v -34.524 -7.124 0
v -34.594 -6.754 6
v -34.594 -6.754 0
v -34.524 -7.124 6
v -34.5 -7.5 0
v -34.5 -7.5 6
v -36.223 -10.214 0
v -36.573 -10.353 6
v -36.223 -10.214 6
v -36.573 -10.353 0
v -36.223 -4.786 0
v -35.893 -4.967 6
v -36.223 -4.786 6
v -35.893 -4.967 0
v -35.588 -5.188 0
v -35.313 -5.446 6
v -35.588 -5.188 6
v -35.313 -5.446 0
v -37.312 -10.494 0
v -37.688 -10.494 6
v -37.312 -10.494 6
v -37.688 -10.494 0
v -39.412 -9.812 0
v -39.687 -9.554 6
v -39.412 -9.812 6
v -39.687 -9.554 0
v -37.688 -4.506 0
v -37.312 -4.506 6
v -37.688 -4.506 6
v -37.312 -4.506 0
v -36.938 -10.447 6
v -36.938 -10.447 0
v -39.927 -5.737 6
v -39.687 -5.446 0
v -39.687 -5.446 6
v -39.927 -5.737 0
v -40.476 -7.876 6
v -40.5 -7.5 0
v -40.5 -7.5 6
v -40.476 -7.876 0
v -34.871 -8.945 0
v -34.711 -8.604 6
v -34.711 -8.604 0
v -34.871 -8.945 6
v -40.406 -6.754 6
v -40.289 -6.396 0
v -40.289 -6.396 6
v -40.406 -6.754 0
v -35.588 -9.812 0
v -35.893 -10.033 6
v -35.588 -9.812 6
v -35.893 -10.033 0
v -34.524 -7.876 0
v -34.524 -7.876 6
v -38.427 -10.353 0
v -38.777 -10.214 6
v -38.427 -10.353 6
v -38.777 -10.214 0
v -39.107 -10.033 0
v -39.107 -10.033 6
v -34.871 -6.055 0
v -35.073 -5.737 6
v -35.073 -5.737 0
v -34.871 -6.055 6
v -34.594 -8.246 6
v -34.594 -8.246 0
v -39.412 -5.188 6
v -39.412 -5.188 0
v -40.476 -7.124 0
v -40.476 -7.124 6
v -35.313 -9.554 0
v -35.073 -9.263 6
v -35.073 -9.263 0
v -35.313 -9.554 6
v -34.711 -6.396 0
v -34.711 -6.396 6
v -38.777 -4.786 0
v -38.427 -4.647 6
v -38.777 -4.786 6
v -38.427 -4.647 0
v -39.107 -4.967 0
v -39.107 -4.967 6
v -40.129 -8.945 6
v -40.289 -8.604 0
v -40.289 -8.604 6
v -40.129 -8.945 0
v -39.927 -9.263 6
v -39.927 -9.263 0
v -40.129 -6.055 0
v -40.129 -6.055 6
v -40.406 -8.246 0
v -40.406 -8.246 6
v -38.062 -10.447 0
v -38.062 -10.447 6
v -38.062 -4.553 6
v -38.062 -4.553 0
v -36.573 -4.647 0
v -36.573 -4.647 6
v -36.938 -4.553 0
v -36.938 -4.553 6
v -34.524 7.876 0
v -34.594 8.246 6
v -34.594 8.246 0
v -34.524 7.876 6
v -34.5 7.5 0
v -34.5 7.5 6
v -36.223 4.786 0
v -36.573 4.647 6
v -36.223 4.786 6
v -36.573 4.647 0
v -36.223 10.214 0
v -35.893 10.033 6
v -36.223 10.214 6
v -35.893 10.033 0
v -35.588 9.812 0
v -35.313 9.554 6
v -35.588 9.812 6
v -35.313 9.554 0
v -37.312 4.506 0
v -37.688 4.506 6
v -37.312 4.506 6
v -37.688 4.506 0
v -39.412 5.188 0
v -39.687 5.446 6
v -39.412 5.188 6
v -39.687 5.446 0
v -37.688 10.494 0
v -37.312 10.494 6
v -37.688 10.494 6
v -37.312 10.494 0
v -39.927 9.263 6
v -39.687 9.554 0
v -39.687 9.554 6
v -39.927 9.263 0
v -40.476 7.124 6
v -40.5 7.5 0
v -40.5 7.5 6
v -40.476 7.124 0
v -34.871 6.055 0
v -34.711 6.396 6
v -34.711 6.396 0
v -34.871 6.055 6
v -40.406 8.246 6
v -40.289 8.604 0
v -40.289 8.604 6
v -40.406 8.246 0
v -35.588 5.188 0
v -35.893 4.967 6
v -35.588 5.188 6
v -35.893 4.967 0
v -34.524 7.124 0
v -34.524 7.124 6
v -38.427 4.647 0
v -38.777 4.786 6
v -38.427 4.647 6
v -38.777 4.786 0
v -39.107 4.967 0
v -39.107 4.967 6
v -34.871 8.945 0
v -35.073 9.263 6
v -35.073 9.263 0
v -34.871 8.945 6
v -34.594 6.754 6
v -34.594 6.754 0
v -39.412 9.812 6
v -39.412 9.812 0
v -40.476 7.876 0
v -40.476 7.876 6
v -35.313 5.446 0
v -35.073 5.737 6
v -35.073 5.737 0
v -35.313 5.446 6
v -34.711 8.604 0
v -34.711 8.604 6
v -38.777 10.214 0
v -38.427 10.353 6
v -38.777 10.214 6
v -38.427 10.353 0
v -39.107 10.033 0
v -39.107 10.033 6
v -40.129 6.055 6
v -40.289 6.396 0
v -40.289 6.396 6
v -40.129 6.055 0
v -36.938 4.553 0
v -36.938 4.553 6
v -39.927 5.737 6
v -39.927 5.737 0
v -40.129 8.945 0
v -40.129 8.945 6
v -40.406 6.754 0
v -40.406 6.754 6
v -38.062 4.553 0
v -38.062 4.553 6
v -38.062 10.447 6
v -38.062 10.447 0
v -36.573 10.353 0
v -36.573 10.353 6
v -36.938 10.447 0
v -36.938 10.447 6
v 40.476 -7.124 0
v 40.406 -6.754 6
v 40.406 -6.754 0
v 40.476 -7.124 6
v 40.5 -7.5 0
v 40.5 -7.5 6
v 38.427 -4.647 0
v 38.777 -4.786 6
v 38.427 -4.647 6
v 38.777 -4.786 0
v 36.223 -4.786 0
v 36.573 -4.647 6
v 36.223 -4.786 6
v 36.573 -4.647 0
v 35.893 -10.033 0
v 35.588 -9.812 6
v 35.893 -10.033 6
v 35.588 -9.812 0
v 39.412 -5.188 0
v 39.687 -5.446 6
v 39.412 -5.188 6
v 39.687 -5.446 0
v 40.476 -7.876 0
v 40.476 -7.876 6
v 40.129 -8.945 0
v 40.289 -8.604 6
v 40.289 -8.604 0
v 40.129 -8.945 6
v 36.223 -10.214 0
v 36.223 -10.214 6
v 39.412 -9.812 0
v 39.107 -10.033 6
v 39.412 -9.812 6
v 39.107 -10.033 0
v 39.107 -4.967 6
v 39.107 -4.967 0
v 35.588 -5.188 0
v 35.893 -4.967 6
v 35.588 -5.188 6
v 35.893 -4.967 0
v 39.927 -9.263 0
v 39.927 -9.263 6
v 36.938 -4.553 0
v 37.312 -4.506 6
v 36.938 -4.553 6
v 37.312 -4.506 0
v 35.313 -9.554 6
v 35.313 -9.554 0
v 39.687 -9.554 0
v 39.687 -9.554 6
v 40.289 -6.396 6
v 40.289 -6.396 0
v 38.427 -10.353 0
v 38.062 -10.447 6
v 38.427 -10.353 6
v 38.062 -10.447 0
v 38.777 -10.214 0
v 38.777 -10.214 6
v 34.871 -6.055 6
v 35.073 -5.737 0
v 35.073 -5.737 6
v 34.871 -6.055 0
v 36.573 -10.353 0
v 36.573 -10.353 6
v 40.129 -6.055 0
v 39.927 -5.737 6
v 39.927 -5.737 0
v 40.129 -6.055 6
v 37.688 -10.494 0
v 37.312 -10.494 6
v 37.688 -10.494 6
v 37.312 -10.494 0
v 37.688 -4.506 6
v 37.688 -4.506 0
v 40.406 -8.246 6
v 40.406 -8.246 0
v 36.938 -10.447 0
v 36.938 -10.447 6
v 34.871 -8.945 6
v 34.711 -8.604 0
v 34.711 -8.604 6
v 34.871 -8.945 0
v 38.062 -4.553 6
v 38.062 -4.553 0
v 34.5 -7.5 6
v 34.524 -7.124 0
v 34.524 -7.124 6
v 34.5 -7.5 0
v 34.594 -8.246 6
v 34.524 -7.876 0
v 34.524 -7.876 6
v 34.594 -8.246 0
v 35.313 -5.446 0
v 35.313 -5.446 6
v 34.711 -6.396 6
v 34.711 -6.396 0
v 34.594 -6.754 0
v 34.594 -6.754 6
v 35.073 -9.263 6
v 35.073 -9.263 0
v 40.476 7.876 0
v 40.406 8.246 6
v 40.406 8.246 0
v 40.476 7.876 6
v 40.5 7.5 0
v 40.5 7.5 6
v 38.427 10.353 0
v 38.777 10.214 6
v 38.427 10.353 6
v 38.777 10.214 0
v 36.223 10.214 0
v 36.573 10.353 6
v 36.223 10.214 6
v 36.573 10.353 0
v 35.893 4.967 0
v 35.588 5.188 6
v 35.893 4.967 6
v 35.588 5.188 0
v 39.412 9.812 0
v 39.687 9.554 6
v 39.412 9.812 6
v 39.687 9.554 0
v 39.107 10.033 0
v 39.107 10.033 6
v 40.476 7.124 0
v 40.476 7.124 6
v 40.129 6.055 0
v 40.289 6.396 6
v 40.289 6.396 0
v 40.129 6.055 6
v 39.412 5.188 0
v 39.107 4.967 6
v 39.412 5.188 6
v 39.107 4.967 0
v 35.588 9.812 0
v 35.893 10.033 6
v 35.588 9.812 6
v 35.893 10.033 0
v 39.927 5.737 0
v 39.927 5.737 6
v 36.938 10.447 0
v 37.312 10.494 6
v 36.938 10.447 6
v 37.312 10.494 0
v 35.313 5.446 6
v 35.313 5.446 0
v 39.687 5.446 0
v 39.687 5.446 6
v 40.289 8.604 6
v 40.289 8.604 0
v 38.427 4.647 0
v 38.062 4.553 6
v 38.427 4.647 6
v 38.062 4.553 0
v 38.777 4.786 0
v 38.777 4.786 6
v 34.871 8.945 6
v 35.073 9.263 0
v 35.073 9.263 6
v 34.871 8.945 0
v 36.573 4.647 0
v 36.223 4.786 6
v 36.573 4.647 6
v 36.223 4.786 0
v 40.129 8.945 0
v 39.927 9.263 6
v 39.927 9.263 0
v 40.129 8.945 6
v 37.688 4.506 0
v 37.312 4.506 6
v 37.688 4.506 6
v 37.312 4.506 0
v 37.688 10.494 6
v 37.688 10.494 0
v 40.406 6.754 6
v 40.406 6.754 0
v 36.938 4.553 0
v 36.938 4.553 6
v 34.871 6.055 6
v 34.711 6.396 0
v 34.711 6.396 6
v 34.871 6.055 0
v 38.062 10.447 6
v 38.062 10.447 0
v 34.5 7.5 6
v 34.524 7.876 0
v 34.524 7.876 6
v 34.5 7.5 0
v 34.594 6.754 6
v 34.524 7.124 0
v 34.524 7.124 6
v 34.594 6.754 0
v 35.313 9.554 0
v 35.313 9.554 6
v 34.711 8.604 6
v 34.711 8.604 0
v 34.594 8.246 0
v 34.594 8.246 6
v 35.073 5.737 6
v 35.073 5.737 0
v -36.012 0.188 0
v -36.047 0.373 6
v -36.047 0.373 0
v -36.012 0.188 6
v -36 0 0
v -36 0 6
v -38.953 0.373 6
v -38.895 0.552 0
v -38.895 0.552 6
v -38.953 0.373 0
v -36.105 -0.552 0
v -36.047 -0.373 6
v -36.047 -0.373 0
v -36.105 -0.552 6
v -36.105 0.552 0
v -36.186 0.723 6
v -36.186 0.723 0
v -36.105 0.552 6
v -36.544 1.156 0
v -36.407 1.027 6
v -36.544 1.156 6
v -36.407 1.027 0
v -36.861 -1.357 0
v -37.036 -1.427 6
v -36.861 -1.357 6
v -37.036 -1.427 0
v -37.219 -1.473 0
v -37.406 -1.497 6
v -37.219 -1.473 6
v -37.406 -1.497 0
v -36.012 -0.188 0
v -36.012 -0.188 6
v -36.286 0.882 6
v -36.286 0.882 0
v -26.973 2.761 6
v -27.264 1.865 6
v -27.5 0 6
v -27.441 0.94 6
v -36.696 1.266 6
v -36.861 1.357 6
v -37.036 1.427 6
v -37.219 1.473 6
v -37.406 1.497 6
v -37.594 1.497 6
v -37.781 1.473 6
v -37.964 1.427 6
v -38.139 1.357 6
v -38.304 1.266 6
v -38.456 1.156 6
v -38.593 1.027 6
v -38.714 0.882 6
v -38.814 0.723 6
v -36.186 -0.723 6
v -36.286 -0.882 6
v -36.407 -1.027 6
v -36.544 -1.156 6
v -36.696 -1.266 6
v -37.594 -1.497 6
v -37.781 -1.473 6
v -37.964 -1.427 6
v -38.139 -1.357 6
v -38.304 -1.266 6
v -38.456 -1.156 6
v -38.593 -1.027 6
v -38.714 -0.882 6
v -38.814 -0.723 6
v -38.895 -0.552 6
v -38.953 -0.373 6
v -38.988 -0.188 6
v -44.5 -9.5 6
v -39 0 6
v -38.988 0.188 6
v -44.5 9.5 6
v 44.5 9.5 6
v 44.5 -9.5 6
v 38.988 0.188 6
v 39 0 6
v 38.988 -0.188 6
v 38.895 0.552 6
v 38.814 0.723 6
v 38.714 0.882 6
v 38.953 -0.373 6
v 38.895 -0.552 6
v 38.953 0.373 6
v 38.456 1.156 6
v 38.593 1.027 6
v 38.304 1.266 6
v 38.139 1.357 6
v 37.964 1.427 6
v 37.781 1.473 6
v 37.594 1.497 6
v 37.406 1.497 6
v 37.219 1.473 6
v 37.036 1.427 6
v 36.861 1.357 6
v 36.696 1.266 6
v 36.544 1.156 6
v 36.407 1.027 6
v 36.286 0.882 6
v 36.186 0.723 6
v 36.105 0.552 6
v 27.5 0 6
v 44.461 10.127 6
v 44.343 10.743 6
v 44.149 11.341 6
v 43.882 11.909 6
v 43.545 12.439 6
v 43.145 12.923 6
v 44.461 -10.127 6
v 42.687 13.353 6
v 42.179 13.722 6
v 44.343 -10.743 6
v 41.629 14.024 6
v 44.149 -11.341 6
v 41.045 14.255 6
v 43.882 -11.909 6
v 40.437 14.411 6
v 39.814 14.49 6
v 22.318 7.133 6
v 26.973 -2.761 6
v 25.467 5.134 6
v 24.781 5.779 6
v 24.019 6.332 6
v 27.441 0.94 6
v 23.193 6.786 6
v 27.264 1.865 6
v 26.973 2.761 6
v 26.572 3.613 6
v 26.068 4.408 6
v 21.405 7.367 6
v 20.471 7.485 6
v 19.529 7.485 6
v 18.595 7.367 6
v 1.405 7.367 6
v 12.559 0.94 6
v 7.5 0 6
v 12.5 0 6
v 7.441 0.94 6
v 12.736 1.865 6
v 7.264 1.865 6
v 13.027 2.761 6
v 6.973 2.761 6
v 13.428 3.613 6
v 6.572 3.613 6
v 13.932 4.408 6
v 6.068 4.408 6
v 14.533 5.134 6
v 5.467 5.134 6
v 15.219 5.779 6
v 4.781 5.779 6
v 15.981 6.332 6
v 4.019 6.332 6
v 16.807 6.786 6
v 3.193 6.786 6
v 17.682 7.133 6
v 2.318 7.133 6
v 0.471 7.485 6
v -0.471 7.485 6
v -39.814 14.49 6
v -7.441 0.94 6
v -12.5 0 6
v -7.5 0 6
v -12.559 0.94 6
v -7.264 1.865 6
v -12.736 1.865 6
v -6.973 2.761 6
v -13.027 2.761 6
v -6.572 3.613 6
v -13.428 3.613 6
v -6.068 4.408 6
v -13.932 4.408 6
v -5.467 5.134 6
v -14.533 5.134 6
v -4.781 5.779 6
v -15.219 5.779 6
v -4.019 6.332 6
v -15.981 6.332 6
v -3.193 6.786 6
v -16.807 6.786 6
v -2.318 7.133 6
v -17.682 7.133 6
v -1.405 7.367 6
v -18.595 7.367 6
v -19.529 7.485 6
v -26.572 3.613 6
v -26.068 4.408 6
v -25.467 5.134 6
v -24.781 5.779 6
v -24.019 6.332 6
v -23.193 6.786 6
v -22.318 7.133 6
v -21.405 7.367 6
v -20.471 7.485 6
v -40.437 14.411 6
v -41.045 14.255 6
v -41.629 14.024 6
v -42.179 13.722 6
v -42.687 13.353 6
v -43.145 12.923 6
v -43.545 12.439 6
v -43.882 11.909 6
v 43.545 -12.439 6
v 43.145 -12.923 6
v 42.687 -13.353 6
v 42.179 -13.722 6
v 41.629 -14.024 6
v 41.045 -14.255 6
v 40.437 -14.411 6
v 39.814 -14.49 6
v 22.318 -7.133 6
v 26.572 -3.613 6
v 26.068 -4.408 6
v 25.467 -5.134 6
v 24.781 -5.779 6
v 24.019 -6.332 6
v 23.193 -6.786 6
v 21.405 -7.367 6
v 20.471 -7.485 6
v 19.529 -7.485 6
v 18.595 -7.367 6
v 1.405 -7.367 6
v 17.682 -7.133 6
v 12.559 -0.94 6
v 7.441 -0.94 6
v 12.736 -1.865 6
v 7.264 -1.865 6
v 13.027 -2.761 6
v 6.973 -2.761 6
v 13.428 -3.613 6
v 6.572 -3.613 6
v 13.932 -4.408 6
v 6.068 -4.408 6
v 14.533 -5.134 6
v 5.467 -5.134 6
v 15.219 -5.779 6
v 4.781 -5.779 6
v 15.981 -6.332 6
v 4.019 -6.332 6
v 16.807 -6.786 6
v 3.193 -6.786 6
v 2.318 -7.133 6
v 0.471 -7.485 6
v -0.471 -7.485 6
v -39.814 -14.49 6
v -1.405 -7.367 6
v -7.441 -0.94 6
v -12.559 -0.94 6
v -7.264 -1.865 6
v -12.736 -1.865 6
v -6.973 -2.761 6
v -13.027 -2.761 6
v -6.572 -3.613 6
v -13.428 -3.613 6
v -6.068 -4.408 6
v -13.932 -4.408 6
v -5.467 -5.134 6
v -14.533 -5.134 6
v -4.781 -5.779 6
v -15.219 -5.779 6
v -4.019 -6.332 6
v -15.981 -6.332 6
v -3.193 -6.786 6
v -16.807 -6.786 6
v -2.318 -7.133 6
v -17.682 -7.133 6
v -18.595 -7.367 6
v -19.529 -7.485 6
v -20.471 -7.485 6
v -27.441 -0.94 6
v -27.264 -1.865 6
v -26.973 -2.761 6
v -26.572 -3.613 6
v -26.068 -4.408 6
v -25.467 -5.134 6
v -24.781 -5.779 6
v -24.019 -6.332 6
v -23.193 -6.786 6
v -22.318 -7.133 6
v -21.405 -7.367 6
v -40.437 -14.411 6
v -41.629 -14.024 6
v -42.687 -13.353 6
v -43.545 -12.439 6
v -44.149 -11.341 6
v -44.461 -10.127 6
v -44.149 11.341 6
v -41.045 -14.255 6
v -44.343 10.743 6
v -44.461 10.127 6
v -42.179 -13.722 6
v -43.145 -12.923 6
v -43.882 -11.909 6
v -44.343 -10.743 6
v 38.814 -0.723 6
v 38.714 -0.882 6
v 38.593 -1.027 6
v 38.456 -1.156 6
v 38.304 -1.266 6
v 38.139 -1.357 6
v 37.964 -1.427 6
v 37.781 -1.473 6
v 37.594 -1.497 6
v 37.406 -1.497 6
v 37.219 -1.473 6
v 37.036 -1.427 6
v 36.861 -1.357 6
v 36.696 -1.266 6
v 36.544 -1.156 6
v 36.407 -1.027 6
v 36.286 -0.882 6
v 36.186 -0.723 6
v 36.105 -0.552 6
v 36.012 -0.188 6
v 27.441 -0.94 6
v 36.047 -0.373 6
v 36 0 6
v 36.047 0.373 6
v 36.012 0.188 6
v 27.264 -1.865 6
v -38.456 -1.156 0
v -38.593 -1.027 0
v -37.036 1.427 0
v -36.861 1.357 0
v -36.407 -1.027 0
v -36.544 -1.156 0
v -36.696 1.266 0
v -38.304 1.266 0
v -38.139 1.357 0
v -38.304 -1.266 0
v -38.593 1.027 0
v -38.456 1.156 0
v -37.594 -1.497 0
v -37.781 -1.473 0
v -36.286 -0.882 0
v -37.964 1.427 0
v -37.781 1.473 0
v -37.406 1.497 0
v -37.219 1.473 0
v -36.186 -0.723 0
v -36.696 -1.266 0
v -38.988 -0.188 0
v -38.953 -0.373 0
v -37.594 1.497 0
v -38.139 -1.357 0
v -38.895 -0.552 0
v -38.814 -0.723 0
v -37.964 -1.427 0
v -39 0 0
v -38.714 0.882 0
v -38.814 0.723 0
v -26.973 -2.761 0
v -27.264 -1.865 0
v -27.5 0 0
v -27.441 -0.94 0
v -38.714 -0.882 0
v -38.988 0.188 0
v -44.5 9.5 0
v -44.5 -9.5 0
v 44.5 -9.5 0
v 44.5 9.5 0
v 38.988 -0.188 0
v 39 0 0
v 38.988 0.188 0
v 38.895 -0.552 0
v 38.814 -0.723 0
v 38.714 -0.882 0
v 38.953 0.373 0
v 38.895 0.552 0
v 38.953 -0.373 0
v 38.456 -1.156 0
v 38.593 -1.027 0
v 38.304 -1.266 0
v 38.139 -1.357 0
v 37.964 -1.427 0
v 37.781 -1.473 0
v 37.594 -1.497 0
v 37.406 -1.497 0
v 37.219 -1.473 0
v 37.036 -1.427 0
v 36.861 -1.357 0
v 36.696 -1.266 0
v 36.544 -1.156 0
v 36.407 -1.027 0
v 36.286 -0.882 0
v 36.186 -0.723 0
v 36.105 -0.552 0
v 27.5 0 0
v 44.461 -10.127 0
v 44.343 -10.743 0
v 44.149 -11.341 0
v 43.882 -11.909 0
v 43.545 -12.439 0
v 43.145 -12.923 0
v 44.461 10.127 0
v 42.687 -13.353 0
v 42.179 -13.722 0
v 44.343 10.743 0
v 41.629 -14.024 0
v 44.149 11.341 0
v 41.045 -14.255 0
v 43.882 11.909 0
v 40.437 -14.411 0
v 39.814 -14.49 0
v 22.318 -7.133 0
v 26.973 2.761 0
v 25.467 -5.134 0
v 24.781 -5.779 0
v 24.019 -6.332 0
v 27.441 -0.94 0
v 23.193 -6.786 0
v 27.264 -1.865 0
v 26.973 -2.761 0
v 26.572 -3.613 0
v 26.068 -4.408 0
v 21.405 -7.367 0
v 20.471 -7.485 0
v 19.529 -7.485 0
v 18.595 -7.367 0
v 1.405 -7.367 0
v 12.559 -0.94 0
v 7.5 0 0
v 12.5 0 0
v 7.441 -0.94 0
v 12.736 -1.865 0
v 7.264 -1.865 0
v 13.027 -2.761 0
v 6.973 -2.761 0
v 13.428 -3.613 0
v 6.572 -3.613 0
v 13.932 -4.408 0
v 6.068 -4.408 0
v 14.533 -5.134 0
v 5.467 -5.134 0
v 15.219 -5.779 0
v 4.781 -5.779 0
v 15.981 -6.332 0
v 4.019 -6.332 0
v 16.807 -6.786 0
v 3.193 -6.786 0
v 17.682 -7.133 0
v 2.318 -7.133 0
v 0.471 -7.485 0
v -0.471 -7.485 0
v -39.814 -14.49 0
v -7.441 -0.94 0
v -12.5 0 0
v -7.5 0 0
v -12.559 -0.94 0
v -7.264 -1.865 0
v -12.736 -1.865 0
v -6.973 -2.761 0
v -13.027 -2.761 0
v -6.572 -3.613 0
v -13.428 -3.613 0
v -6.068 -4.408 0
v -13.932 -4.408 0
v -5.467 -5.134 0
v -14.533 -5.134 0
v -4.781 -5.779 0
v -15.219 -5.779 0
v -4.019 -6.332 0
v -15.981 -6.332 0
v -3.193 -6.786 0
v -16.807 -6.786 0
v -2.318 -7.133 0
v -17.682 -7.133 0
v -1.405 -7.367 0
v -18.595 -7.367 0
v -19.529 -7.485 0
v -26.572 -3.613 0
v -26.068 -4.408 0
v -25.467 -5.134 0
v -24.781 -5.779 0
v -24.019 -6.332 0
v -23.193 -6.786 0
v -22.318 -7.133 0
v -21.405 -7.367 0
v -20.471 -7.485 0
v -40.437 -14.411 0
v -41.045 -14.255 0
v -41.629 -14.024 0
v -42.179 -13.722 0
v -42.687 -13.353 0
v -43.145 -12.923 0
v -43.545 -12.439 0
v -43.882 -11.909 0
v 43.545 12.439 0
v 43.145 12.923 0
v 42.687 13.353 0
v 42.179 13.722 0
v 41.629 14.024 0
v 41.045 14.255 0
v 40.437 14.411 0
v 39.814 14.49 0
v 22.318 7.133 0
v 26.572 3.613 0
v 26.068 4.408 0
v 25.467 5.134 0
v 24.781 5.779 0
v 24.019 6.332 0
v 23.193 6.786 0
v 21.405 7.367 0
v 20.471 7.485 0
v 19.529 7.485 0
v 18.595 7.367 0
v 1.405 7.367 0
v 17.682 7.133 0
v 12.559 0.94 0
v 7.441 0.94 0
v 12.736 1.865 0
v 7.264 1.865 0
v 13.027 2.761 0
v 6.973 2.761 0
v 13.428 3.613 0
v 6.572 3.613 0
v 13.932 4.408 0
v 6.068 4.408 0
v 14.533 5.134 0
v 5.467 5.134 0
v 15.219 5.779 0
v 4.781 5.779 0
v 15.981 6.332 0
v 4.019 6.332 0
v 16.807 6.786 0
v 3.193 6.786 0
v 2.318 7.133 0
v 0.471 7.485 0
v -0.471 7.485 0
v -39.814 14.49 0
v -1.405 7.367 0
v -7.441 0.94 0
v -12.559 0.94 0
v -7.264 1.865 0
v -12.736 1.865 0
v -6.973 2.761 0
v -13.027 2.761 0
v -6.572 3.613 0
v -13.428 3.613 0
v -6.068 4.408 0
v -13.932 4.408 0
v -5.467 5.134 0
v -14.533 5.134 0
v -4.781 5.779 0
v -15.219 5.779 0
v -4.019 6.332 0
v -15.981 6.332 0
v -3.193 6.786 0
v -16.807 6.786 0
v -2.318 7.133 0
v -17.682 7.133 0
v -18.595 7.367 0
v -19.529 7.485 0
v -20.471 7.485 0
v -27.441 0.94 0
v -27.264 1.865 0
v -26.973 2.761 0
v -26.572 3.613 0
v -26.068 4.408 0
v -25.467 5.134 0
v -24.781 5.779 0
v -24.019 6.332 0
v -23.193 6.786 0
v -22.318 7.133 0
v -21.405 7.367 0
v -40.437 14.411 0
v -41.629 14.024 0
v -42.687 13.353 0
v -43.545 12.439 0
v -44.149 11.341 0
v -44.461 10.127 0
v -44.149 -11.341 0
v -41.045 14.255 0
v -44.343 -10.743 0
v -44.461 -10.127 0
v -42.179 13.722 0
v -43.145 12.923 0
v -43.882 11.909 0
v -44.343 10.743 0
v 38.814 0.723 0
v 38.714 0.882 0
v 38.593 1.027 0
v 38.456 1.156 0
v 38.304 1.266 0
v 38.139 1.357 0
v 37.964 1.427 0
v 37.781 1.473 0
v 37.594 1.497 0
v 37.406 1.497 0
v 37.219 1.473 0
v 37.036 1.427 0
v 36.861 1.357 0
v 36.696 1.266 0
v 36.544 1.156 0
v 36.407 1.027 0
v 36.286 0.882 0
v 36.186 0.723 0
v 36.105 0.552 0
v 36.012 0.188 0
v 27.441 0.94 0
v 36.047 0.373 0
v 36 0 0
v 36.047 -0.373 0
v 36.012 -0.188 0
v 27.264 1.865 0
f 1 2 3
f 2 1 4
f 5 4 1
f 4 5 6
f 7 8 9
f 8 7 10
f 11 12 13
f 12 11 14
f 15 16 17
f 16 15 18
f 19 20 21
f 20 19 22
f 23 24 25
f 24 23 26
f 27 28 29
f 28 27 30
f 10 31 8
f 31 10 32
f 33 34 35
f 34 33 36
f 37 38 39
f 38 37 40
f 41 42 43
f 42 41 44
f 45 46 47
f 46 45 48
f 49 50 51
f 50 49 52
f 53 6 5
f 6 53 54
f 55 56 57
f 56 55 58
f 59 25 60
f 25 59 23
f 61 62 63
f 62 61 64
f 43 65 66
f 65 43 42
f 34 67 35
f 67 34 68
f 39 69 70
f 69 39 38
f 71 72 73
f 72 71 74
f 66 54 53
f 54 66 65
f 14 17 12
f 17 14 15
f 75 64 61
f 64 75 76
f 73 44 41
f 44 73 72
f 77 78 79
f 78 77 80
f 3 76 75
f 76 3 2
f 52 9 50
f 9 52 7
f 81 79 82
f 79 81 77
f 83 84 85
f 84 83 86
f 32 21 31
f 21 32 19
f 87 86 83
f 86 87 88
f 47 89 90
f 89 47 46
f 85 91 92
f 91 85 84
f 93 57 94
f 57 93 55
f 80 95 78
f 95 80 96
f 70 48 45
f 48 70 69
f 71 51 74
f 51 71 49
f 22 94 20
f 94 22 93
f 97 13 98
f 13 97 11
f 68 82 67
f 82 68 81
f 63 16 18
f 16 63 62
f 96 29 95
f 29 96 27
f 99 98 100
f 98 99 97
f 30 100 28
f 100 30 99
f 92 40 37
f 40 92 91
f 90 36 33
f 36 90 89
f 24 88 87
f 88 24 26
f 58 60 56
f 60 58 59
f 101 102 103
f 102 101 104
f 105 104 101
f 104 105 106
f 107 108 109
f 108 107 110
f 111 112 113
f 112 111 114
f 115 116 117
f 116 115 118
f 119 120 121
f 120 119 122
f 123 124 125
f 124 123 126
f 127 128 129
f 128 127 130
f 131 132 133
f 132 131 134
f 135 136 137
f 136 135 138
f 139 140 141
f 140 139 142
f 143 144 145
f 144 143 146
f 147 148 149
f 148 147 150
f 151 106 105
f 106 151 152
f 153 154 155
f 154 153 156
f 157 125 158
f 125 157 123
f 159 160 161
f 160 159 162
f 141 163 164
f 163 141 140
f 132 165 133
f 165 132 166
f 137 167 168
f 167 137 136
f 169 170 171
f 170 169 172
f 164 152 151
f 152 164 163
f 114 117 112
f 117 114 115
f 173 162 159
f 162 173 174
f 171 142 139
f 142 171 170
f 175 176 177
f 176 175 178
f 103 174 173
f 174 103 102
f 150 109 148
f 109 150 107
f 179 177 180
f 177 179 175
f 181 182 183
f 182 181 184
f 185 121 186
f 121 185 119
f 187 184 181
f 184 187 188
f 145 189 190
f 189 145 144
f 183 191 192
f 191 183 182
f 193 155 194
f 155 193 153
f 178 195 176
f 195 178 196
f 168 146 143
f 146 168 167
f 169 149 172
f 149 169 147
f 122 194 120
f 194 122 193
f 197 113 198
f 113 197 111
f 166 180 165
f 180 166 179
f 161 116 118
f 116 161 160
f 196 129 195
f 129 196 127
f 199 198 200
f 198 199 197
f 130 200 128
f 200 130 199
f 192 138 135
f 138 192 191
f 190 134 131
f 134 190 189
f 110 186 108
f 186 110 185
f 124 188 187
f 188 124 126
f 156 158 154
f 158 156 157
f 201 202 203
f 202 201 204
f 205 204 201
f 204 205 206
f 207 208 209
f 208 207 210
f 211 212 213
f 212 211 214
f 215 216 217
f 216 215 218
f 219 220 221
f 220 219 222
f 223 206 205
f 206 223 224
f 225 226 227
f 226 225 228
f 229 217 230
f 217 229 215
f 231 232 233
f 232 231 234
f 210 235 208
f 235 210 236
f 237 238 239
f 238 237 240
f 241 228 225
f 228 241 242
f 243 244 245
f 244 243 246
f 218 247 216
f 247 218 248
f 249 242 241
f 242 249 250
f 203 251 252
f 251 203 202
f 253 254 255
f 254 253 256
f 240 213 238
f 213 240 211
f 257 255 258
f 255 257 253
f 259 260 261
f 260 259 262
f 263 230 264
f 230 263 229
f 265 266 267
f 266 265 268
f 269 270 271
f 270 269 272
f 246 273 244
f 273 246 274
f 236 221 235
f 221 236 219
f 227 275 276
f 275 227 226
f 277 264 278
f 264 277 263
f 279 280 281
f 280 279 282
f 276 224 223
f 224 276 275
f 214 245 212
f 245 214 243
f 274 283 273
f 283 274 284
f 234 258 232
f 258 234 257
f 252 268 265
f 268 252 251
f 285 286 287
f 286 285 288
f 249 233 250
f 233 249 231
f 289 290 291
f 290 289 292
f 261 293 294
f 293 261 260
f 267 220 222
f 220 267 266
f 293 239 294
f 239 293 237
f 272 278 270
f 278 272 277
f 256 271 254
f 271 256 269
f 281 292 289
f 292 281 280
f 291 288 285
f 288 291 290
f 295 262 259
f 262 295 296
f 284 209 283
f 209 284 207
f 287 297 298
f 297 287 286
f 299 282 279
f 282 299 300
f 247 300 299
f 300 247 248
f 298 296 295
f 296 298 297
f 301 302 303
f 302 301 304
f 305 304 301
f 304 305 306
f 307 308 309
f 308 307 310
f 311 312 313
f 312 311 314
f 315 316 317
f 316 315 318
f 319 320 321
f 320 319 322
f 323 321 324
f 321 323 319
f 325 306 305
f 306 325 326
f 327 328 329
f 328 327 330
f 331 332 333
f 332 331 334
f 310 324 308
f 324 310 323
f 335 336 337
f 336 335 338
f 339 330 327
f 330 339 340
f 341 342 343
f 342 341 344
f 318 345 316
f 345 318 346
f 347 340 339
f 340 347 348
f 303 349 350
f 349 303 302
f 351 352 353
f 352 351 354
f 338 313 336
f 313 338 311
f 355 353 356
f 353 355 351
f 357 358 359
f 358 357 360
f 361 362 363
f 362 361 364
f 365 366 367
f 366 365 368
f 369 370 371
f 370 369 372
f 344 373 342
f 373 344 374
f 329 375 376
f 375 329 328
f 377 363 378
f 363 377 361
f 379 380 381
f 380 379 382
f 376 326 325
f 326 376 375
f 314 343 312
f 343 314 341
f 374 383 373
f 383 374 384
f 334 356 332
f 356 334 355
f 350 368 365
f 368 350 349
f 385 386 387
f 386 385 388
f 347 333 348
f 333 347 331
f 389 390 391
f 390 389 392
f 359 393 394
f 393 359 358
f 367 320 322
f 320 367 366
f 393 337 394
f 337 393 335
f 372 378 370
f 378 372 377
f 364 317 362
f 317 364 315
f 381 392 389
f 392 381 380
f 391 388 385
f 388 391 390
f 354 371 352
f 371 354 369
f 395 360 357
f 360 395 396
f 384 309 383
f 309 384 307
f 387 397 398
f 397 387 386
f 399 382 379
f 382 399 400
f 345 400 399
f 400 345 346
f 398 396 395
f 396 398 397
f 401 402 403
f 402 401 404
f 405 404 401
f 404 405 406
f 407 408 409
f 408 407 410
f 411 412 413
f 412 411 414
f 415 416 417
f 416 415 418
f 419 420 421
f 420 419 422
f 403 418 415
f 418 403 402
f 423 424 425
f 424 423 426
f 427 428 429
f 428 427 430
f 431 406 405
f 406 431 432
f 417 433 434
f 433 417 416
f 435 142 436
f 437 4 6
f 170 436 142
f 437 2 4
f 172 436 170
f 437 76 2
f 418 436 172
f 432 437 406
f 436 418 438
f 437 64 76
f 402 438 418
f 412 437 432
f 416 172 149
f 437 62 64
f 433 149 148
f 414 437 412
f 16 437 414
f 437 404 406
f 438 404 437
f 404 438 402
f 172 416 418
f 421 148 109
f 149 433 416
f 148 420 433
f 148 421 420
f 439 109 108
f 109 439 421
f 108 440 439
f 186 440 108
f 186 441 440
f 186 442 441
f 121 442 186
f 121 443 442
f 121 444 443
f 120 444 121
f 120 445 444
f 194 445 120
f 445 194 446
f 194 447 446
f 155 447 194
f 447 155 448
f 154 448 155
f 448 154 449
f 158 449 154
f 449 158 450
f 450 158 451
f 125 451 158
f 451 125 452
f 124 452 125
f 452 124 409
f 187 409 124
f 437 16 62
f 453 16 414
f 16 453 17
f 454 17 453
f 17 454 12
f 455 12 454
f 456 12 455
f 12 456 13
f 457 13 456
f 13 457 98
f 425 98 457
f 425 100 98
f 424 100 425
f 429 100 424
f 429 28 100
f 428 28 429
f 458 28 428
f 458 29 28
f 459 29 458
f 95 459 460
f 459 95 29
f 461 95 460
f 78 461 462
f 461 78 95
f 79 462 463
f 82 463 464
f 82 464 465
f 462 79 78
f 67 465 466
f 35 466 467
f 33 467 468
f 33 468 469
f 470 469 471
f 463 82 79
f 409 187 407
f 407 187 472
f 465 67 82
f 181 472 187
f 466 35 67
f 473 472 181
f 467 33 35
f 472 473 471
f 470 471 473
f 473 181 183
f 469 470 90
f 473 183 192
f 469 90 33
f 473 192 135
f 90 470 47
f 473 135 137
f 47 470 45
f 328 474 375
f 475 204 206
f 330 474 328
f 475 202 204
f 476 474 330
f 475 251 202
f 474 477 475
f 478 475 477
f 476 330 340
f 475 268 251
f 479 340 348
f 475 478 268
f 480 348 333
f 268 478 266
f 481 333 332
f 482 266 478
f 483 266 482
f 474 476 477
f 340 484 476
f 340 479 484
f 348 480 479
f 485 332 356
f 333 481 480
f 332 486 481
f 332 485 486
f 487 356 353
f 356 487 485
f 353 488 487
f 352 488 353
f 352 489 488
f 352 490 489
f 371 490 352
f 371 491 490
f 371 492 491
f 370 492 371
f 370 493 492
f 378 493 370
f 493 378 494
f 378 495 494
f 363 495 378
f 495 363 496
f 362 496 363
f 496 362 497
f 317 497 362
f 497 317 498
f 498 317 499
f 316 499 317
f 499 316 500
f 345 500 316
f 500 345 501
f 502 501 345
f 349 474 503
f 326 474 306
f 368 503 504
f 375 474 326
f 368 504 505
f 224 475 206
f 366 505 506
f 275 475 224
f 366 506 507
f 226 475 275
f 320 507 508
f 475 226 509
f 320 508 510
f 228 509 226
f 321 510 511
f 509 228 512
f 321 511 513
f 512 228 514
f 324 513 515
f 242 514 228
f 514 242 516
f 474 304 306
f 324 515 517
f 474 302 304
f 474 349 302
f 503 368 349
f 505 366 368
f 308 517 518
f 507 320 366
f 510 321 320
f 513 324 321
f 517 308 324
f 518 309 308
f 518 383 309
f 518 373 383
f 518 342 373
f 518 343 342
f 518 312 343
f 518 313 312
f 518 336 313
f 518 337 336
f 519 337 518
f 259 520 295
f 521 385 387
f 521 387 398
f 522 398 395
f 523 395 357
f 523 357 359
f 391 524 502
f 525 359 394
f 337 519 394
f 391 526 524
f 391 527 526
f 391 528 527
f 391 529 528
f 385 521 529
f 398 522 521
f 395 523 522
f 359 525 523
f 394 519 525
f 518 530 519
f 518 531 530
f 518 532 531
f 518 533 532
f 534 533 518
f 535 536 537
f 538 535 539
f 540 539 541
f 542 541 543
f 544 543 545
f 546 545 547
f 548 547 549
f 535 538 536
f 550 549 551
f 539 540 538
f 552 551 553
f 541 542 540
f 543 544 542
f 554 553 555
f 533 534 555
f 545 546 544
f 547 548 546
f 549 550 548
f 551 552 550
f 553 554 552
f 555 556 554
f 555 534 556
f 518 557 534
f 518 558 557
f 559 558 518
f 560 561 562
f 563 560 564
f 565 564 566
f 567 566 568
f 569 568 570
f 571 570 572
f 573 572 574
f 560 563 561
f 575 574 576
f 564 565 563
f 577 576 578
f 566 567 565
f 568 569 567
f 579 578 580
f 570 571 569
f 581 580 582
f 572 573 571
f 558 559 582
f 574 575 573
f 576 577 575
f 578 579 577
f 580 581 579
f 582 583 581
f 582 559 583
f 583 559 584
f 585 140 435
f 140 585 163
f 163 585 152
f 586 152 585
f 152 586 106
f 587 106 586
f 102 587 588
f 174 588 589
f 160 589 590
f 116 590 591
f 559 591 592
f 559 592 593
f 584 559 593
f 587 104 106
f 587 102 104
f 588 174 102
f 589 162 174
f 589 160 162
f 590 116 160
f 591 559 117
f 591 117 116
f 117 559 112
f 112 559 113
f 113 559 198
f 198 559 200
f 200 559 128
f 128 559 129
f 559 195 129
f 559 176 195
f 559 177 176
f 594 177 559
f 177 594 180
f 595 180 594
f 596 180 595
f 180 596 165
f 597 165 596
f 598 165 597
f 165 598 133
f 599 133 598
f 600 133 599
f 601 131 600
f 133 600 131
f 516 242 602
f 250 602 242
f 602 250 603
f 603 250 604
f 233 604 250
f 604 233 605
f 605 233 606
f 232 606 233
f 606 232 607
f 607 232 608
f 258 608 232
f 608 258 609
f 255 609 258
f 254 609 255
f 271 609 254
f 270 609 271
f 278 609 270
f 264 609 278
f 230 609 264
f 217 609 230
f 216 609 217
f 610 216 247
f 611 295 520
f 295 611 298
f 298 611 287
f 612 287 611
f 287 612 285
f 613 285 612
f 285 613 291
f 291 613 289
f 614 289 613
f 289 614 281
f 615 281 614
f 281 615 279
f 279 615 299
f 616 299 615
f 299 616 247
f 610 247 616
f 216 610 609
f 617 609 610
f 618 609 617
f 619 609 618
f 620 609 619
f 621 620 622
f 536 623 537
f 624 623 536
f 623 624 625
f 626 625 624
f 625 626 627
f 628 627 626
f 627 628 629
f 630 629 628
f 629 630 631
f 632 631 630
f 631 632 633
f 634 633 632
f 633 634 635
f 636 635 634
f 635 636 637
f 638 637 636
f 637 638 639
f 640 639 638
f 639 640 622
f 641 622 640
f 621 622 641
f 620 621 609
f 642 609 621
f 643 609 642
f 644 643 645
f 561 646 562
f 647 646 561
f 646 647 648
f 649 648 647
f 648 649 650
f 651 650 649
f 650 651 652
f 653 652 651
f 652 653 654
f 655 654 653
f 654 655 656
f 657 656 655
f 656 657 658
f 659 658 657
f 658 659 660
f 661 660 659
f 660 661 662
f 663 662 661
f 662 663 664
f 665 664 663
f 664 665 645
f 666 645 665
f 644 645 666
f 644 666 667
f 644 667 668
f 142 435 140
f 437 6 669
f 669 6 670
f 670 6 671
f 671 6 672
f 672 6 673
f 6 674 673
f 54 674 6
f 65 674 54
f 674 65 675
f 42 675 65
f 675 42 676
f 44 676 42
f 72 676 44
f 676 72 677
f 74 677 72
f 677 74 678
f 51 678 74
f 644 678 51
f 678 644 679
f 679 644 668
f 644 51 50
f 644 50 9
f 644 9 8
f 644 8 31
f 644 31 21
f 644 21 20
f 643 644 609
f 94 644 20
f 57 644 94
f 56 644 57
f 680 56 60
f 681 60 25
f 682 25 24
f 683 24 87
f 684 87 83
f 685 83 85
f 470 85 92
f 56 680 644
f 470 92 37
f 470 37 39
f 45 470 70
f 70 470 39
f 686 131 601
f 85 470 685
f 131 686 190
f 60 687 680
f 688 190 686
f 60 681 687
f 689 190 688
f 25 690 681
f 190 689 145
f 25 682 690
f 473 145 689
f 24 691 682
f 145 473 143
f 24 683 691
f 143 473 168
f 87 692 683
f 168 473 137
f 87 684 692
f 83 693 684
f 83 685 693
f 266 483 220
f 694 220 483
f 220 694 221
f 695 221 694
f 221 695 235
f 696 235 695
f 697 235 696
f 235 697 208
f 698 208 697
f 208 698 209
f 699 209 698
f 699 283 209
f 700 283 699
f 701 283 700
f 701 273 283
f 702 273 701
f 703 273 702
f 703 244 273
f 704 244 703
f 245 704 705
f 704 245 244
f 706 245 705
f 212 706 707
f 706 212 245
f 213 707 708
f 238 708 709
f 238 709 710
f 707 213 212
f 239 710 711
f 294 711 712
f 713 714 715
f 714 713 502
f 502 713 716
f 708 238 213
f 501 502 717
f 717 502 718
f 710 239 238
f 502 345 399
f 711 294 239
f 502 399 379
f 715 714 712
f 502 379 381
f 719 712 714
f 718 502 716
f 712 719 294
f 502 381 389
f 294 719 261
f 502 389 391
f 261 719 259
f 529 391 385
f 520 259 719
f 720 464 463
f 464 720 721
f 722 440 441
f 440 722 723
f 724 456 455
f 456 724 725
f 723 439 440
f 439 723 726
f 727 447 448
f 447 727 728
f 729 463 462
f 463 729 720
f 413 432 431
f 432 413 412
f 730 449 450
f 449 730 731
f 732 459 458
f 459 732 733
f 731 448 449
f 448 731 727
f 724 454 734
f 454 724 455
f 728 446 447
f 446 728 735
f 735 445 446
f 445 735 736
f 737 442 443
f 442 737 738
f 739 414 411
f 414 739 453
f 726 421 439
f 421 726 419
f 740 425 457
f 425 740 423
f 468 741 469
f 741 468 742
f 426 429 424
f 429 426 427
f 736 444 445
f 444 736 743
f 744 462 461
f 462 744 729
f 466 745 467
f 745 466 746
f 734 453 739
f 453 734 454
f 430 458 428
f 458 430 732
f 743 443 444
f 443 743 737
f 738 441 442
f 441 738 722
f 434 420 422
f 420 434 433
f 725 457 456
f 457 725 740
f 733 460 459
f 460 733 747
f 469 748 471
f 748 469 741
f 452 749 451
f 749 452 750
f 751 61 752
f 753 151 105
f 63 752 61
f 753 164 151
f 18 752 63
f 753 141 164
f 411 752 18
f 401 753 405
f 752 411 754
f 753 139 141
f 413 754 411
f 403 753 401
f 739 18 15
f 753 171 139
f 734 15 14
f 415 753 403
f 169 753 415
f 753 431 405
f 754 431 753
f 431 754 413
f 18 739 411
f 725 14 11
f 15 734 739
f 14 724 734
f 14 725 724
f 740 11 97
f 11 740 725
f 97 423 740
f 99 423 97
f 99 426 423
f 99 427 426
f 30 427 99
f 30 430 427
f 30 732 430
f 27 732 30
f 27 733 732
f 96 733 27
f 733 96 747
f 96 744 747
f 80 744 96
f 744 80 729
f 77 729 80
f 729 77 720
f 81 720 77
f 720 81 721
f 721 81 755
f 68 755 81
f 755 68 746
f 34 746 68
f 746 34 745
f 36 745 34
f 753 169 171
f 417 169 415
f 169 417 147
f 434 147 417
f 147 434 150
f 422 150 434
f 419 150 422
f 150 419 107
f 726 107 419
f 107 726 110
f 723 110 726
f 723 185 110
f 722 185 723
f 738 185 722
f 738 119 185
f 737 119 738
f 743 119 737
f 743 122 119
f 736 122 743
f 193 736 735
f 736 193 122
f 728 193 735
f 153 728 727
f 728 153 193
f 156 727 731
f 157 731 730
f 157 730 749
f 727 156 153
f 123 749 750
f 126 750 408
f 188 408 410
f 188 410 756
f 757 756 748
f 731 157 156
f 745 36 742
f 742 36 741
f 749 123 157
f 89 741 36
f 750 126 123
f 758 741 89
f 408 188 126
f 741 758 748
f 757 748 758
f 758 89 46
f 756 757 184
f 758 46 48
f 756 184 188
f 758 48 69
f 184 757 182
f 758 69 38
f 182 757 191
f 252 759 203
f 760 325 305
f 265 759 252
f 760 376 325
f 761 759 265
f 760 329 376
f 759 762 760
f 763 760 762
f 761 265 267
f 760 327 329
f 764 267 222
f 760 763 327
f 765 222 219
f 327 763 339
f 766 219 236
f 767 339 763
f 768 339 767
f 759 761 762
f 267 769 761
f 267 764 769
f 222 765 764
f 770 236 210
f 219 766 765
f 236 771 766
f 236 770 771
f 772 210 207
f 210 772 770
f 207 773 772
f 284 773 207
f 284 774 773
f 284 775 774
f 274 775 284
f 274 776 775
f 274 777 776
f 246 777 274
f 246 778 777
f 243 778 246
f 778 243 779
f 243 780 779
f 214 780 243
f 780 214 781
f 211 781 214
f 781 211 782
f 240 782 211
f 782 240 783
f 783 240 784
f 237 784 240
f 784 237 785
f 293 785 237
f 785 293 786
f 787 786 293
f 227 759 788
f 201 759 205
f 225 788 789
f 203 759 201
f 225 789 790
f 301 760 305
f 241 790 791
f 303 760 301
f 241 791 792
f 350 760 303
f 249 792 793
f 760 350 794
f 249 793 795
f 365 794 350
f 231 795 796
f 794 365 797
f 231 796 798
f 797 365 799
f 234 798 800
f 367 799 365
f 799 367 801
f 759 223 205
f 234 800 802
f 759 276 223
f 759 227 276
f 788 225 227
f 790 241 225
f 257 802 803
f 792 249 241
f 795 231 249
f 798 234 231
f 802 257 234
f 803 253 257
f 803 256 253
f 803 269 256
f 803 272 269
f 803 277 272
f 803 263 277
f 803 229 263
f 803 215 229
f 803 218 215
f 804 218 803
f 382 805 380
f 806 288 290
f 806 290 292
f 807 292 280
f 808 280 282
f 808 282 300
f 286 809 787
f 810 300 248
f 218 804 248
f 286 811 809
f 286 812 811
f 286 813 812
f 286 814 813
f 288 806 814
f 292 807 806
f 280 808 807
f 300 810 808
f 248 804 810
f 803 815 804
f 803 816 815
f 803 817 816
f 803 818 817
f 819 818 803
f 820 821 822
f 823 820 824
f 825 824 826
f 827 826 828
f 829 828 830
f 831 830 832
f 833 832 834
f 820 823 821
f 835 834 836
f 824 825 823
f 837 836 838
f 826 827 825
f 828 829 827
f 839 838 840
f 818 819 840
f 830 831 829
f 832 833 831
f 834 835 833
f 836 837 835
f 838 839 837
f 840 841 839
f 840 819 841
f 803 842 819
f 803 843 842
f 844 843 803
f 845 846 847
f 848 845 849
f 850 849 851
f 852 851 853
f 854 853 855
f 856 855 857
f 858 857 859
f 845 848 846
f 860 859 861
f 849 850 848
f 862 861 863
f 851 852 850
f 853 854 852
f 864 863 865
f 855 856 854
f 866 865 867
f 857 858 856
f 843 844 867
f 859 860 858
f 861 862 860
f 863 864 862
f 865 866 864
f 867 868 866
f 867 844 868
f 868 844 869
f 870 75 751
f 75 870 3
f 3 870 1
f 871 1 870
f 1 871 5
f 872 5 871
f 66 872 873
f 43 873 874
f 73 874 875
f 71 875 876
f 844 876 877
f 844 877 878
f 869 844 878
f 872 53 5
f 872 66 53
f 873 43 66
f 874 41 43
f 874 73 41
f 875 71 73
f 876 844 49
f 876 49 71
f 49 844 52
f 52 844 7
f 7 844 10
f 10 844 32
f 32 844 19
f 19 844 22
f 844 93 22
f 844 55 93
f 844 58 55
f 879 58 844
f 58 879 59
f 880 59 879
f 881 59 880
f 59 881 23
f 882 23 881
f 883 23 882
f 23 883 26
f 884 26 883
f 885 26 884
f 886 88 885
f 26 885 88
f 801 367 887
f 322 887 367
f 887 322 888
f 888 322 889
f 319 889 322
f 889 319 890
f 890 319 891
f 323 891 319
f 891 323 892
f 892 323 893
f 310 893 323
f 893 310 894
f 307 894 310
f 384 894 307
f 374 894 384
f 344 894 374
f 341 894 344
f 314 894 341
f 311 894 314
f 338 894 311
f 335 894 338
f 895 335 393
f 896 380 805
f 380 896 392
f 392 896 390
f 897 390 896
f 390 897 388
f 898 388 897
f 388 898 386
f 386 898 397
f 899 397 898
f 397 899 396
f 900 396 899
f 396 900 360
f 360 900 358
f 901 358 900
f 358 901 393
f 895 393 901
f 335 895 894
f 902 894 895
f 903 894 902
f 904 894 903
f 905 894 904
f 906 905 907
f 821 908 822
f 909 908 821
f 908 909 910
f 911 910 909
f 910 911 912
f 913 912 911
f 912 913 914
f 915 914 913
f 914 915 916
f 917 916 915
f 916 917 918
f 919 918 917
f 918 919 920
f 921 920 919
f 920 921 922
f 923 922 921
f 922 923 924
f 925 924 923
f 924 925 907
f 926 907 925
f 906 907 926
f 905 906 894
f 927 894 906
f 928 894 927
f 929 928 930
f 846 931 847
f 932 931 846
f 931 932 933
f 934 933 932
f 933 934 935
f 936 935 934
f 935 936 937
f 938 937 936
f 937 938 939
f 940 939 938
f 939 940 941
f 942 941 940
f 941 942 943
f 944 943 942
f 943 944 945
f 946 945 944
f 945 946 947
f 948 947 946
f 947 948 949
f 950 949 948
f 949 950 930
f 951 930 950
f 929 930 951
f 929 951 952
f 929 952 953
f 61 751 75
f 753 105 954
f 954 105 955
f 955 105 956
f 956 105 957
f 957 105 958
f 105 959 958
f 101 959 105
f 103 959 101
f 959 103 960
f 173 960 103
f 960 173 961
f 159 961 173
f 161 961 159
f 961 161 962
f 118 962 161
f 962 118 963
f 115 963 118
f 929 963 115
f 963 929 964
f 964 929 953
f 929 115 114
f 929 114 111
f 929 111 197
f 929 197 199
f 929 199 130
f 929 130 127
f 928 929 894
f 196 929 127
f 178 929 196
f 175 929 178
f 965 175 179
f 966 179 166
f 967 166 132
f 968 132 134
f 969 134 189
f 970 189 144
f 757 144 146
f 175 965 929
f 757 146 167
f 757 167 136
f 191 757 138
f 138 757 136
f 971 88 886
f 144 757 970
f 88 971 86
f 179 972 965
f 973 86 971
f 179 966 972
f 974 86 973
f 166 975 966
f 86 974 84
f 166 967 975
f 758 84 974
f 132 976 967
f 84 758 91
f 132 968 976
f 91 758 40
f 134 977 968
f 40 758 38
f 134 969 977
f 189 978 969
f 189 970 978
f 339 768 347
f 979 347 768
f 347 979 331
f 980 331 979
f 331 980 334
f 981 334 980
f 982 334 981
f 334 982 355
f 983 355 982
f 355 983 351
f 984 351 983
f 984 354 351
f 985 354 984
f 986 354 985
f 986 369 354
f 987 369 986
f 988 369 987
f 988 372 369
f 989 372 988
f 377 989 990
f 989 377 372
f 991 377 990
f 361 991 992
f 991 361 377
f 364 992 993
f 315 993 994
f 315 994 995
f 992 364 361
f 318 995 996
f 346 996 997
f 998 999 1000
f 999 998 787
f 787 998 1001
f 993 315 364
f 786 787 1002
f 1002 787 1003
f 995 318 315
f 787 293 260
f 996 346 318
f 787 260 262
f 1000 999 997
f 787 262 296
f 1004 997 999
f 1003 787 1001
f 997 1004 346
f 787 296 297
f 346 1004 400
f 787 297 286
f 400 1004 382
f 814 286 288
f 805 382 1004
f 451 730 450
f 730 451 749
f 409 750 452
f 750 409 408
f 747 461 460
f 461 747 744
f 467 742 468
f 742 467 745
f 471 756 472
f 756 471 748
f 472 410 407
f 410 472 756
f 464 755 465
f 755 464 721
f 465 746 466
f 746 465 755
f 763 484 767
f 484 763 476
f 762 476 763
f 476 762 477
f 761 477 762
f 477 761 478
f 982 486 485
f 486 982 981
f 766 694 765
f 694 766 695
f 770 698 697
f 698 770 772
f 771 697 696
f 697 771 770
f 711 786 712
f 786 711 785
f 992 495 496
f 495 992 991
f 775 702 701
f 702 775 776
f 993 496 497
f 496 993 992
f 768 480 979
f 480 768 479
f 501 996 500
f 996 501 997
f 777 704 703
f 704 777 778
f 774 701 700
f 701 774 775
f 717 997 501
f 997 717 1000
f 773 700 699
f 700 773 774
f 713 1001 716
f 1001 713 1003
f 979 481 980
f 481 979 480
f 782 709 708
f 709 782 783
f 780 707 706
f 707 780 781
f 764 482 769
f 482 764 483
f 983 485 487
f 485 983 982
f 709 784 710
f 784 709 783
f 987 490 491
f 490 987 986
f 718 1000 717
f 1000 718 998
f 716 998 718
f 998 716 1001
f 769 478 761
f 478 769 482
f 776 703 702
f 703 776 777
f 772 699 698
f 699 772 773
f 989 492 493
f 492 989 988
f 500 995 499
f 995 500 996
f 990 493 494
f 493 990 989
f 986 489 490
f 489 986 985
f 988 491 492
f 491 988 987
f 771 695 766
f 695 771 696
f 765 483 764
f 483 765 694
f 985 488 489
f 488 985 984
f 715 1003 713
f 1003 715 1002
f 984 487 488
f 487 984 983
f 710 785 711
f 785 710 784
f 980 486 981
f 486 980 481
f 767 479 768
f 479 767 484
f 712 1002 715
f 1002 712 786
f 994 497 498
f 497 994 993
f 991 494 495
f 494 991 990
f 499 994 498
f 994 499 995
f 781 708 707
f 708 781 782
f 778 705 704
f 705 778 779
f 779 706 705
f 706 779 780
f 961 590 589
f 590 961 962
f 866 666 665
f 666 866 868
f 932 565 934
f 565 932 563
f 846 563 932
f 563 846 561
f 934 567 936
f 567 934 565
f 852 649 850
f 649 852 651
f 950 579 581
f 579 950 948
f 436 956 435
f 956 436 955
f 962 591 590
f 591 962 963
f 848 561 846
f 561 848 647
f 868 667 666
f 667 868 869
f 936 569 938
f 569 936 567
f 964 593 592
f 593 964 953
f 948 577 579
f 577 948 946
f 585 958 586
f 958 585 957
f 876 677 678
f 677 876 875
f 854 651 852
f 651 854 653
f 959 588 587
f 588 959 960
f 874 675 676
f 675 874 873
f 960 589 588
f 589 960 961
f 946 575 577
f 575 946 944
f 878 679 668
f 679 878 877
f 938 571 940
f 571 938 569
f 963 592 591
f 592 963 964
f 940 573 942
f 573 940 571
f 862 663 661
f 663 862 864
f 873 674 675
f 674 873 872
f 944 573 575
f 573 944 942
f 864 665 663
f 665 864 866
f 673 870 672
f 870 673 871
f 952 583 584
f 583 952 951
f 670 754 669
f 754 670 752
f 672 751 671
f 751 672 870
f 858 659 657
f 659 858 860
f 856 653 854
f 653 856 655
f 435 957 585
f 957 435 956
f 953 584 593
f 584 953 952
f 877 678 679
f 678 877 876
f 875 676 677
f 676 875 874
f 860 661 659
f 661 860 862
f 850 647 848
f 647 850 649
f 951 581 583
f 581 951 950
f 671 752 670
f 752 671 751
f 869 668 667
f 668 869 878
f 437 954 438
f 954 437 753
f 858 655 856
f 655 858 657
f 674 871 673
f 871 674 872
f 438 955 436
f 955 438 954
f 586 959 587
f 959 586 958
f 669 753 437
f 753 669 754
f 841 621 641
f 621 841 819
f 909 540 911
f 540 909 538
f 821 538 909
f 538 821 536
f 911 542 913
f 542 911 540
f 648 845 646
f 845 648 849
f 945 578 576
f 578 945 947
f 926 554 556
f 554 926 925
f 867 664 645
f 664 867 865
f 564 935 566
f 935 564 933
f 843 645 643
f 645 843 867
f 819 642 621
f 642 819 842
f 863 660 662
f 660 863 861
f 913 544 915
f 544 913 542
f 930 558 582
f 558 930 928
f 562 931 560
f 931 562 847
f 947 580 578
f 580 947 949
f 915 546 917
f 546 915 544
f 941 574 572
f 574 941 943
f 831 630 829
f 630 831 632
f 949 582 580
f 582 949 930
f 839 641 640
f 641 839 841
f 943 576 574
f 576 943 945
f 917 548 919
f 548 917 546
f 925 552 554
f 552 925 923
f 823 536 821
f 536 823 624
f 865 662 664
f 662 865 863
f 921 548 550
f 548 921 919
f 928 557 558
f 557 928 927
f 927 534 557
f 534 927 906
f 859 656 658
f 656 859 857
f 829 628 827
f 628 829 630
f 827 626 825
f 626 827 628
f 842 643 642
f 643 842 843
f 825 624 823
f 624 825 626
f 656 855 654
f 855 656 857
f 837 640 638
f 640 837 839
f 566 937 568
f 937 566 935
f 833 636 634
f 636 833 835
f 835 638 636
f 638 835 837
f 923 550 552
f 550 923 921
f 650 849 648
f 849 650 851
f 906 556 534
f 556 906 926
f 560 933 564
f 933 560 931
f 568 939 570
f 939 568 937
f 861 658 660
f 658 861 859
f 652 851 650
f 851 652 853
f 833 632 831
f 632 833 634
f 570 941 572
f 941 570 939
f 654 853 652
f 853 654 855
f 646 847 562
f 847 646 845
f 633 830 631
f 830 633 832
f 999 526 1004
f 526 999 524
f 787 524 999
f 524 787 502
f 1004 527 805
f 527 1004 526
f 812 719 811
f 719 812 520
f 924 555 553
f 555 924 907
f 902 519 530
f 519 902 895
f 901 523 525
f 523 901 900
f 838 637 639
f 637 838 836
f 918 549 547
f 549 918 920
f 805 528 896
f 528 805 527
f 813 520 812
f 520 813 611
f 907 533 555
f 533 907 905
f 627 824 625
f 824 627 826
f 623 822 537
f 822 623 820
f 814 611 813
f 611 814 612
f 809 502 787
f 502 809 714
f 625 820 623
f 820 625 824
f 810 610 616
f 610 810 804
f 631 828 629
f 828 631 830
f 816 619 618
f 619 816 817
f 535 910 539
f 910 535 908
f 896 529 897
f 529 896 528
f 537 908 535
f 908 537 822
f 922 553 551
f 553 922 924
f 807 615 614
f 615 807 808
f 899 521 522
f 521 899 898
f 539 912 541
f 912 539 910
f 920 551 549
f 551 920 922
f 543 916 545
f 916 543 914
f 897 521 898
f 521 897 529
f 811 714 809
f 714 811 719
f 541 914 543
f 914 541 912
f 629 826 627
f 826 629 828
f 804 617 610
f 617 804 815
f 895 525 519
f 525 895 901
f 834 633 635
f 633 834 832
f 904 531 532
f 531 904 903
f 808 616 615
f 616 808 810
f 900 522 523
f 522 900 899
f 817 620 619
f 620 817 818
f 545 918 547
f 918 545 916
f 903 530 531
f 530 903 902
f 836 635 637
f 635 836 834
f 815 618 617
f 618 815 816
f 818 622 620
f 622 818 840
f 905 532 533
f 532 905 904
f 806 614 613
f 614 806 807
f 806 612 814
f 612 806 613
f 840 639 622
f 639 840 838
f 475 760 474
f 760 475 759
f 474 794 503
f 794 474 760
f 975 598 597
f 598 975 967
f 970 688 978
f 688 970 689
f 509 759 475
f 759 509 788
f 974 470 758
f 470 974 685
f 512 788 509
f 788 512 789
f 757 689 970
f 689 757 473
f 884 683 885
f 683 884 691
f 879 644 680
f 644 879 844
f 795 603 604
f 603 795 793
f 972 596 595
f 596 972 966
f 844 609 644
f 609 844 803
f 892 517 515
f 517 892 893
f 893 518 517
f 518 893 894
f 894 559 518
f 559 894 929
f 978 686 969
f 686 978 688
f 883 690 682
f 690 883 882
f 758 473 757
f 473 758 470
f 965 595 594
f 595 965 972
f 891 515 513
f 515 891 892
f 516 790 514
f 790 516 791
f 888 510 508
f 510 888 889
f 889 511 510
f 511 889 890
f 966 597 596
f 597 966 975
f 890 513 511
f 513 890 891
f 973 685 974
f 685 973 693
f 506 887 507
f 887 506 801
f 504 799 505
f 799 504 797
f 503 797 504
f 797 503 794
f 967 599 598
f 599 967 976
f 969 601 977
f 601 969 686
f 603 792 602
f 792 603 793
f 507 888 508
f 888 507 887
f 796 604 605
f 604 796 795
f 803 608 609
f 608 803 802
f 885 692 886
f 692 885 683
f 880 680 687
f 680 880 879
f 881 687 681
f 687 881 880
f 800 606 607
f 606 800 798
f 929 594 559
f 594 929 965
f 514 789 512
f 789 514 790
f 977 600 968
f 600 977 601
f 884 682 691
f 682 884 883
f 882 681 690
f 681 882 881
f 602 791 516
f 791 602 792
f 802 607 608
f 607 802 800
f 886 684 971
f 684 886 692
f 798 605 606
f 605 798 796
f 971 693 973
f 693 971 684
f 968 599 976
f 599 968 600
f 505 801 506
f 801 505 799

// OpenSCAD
$fn = 50;


difference() {
	union() {
		hull() {
			translate(v = [-39.5000000000, 9.5000000000, 0]) {
				cylinder(h = 6, r = 5);
			}
			translate(v = [39.5000000000, 9.5000000000, 0]) {
				cylinder(h = 6, r = 5);
			}
			translate(v = [-39.5000000000, -9.5000000000, 0]) {
				cylinder(h = 6, r = 5);
			}
			translate(v = [39.5000000000, -9.5000000000, 0]) {
				cylinder(h = 6, r = 5);
			}
		}
	}
	union() {
		#translate(v = [-37.5000000000, -7.5000000000, 0]) {
			cylinder(h = 6, r = 3.0000000000);
		}
		#translate(v = [-37.5000000000, 7.5000000000, 0]) {
			cylinder(h = 6, r = 3.0000000000);
		}
		#translate(v = [37.5000000000, -7.5000000000, 0]) {
			cylinder(h = 6, r = 3.0000000000);
		}
		#translate(v = [37.5000000000, 7.5000000000, 0]) {
			cylinder(h = 6, r = 3.0000000000);
		}
		#translate(v = [-37.5000000000, -7.5000000000, -100.0000000000]) {
			cylinder(h = 200, r = 3.0000000000);
		}
		#translate(v = [-37.5000000000, 7.5000000000, -100.0000000000]) {
			cylinder(h = 200, r = 3.0000000000);
		}
		#translate(v = [37.5000000000, -7.5000000000, -100.0000000000]) {
			cylinder(h = 200, r = 3.0000000000);
		}
		#translate(v = [37.5000000000, 7.5000000000, -100.0000000000]) {
			cylinder(h = 200, r = 3.0000000000);
		}
		#translate(v = [-37.5000000000, -7.5000000000, 0]) {
			cylinder(h = 6, r = 1.5000000000);
		}
		#translate(v = [-37.5000000000, 0.0000000000, 0]) {
			cylinder(h = 6, r = 1.5000000000);
		}
		#translate(v = [-37.5000000000, 7.5000000000, 0]) {
			cylinder(h = 6, r = 1.5000000000);
		}
		#translate(v = [37.5000000000, -7.5000000000, 0]) {
			cylinder(h = 6, r = 1.5000000000);
		}
		#translate(v = [37.5000000000, 0.0000000000, 0]) {
			cylinder(h = 6, r = 1.5000000000);
		}
		#translate(v = [37.5000000000, 7.5000000000, 0]) {
			cylinder(h = 6, r = 1.5000000000);
		}
		#translate(v = [-37.5000000000, -7.5000000000, 0]) {
			cylinder(h = 6, r = 1.5000000000);
		}
		#translate(v = [-37.5000000000, 0.0000000000, 0]) {
			cylinder(h = 6, r = 1.5000000000);
		}
		#translate(v = [-37.5000000000, 7.5000000000, 0]) {
			cylinder(h = 6, r = 1.5000000000);
		}
		#translate(v = [37.5000000000, -7.5000000000, 0]) {
			cylinder(h = 6, r = 1.5000000000);
		}
		#translate(v = [37.5000000000, 0.0000000000, 0]) {
			cylinder(h = 6, r = 1.5000000000);
		}
		#translate(v = [37.5000000000, 7.5000000000, 0]) {
			cylinder(h = 6, r = 1.5000000000);
		}
		#translate(v = [-37.5000000000, -7.5000000000, 0]) {
			cylinder(h = 6, r = 1.5000000000);
		}
		#translate(v = [-37.5000000000, 0.0000000000, 0]) {
			cylinder(h = 6, r = 1.5000000000);
		}
		#translate(v = [-37.5000000000, 7.5000000000, 0]) {
			cylinder(h = 6, r = 1.5000000000);
		}
		#translate(v = [37.5000000000, -7.5000000000, 0]) {
			cylinder(h = 6, r = 1.5000000000);
		}
		#translate(v = [37.5000000000, 0.0000000000, 0]) {
			cylinder(h = 6, r = 1.5000000000);
		}
		#translate(v = [37.5000000000, 7.5000000000, 0]) {
			cylinder(h = 6, r = 1.5000000000);
		}
		#translate(v = [-20.0000000000, 0, 0]) {
			cylinder(h = 6, r = 7.5000000000);
		}
		#cylinder(h = 6, r = 7.5000000000);
		#translate(v = [20.0000000000, 0, 0]) {
			cylinder(h = 6, r = 7.5000000000);
		}
	}
}
